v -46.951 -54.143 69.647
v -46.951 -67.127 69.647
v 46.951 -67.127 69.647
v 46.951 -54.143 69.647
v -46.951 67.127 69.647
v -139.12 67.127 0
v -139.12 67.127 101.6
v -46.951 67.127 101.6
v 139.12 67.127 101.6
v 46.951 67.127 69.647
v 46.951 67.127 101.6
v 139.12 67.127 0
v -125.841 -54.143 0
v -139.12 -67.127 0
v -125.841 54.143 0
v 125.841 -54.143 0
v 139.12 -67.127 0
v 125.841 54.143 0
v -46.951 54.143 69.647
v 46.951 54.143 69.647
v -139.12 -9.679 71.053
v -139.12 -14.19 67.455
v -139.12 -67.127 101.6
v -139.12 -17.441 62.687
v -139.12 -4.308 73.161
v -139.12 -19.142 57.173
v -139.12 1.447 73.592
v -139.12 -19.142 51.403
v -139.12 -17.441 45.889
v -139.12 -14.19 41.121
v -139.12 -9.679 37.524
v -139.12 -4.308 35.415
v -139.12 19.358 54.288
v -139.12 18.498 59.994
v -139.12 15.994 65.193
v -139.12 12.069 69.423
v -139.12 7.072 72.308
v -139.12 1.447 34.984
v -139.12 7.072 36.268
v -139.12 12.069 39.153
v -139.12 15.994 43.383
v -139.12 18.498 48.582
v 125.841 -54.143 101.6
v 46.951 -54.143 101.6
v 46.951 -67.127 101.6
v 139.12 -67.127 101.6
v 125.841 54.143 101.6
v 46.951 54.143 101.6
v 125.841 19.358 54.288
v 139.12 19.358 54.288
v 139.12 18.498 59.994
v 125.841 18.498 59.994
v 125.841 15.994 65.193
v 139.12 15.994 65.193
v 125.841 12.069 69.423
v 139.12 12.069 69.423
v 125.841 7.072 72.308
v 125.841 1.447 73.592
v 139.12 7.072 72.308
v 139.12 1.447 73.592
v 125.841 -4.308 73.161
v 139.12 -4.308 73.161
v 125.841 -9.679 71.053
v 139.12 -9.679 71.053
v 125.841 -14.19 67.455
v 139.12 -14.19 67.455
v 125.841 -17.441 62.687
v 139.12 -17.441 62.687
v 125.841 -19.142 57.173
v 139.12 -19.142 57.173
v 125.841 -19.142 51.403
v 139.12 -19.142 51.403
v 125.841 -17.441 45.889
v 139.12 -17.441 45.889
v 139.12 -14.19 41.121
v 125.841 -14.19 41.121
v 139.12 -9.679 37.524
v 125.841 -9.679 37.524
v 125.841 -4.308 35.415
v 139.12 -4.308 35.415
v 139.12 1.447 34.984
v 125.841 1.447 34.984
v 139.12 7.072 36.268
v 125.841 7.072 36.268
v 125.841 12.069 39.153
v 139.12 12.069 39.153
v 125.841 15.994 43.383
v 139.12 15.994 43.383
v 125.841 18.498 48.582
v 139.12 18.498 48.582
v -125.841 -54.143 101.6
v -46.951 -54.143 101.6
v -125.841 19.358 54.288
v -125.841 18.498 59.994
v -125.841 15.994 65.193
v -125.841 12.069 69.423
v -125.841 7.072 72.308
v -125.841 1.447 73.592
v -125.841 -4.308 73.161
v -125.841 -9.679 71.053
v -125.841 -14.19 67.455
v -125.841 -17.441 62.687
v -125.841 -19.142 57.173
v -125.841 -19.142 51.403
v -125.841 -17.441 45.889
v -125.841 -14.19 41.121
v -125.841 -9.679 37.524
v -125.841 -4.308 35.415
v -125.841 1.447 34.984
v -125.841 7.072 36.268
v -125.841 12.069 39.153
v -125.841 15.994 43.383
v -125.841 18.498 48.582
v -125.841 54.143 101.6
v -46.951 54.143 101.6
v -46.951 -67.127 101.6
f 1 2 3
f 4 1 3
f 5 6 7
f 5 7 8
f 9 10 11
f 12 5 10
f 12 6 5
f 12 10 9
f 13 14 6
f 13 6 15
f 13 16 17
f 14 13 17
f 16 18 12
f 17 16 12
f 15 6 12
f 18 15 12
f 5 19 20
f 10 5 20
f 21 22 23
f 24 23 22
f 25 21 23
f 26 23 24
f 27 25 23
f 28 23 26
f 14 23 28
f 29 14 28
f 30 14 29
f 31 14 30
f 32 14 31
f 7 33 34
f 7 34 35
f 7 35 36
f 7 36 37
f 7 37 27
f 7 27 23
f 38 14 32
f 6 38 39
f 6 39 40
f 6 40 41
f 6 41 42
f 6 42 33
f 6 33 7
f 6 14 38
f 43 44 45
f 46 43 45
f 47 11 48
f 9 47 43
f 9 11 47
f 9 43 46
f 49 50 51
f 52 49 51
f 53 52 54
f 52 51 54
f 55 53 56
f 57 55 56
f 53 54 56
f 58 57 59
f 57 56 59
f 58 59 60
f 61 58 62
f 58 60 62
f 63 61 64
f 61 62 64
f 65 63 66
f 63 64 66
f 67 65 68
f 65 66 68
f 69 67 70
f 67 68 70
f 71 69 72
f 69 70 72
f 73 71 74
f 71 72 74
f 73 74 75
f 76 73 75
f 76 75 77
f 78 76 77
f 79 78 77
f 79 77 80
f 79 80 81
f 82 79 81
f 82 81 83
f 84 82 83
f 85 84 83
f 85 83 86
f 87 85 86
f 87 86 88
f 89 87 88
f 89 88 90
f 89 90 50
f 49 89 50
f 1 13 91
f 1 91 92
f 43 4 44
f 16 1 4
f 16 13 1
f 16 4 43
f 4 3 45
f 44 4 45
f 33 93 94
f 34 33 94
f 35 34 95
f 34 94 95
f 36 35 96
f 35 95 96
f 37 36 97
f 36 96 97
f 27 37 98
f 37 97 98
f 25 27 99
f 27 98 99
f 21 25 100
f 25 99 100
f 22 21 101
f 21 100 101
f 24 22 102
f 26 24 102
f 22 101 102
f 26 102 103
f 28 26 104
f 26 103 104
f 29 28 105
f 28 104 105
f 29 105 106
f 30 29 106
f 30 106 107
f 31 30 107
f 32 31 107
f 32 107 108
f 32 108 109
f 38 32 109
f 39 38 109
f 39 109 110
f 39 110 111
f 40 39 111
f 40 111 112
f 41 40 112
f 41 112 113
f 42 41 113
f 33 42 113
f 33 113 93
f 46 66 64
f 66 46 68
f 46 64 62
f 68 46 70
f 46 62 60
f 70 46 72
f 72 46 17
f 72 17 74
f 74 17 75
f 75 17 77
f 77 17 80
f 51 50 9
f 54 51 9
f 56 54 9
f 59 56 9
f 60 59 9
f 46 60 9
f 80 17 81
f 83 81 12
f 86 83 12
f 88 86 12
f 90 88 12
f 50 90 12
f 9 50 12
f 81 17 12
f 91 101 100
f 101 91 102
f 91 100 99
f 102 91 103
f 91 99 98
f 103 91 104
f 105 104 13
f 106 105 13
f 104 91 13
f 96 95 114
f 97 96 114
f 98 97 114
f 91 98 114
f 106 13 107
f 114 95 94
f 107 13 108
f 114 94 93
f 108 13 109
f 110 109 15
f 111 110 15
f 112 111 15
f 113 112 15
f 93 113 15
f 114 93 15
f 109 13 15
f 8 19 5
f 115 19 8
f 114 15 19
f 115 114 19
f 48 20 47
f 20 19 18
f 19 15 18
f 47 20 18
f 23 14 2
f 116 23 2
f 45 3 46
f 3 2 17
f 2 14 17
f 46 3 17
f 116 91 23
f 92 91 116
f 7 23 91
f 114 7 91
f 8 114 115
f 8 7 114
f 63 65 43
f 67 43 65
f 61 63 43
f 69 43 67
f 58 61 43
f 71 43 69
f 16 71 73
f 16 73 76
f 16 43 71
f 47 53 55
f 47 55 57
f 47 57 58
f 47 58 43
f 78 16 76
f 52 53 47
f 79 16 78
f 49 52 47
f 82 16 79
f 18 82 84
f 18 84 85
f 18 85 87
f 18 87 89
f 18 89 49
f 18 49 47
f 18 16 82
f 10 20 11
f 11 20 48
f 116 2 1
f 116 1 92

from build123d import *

# Parameters (mm, degrees)
F0_W     = 278.240532
F0_H     = 134.254978
F0_W_2   = 251.682728
F0_H_2   = 108.286024
F1_DEPTH = 101.6
F2_R     = 19.357944
F3_DEPTH = 278.241532
F4_W     = 93.901328
F4_H     = 31.952637
F5_DEPTH = 134.255977


with BuildPart() as f1:
    # F0 (on Top) → F1 (new body)
    with BuildSketch(Plane.XY):
        Rectangle(F0_W, F0_H)
        Rectangle(F0_W_2, F0_H_2, mode=Mode.SUBTRACT)
    extrude(amount=F1_DEPTH)

    # F2 (on face) → F3 (cut, through all)
    with BuildSketch(Plane.YZ.offset(139.120266)):
        with Locations((0, 54.288089)):
            Circle(F2_R)
    extrude(amount=-F3_DEPTH, mode=Mode.SUBTRACT)

    # F4 (on face) → F5 (cut, through all)
    with BuildSketch(Plane.XZ.offset(67.127489)):
        with Locations((0, 85.623682)):
            Rectangle(F4_W, F4_H)
    extrude(amount=-F5_DEPTH, mode=Mode.SUBTRACT)


solid = f1.part
